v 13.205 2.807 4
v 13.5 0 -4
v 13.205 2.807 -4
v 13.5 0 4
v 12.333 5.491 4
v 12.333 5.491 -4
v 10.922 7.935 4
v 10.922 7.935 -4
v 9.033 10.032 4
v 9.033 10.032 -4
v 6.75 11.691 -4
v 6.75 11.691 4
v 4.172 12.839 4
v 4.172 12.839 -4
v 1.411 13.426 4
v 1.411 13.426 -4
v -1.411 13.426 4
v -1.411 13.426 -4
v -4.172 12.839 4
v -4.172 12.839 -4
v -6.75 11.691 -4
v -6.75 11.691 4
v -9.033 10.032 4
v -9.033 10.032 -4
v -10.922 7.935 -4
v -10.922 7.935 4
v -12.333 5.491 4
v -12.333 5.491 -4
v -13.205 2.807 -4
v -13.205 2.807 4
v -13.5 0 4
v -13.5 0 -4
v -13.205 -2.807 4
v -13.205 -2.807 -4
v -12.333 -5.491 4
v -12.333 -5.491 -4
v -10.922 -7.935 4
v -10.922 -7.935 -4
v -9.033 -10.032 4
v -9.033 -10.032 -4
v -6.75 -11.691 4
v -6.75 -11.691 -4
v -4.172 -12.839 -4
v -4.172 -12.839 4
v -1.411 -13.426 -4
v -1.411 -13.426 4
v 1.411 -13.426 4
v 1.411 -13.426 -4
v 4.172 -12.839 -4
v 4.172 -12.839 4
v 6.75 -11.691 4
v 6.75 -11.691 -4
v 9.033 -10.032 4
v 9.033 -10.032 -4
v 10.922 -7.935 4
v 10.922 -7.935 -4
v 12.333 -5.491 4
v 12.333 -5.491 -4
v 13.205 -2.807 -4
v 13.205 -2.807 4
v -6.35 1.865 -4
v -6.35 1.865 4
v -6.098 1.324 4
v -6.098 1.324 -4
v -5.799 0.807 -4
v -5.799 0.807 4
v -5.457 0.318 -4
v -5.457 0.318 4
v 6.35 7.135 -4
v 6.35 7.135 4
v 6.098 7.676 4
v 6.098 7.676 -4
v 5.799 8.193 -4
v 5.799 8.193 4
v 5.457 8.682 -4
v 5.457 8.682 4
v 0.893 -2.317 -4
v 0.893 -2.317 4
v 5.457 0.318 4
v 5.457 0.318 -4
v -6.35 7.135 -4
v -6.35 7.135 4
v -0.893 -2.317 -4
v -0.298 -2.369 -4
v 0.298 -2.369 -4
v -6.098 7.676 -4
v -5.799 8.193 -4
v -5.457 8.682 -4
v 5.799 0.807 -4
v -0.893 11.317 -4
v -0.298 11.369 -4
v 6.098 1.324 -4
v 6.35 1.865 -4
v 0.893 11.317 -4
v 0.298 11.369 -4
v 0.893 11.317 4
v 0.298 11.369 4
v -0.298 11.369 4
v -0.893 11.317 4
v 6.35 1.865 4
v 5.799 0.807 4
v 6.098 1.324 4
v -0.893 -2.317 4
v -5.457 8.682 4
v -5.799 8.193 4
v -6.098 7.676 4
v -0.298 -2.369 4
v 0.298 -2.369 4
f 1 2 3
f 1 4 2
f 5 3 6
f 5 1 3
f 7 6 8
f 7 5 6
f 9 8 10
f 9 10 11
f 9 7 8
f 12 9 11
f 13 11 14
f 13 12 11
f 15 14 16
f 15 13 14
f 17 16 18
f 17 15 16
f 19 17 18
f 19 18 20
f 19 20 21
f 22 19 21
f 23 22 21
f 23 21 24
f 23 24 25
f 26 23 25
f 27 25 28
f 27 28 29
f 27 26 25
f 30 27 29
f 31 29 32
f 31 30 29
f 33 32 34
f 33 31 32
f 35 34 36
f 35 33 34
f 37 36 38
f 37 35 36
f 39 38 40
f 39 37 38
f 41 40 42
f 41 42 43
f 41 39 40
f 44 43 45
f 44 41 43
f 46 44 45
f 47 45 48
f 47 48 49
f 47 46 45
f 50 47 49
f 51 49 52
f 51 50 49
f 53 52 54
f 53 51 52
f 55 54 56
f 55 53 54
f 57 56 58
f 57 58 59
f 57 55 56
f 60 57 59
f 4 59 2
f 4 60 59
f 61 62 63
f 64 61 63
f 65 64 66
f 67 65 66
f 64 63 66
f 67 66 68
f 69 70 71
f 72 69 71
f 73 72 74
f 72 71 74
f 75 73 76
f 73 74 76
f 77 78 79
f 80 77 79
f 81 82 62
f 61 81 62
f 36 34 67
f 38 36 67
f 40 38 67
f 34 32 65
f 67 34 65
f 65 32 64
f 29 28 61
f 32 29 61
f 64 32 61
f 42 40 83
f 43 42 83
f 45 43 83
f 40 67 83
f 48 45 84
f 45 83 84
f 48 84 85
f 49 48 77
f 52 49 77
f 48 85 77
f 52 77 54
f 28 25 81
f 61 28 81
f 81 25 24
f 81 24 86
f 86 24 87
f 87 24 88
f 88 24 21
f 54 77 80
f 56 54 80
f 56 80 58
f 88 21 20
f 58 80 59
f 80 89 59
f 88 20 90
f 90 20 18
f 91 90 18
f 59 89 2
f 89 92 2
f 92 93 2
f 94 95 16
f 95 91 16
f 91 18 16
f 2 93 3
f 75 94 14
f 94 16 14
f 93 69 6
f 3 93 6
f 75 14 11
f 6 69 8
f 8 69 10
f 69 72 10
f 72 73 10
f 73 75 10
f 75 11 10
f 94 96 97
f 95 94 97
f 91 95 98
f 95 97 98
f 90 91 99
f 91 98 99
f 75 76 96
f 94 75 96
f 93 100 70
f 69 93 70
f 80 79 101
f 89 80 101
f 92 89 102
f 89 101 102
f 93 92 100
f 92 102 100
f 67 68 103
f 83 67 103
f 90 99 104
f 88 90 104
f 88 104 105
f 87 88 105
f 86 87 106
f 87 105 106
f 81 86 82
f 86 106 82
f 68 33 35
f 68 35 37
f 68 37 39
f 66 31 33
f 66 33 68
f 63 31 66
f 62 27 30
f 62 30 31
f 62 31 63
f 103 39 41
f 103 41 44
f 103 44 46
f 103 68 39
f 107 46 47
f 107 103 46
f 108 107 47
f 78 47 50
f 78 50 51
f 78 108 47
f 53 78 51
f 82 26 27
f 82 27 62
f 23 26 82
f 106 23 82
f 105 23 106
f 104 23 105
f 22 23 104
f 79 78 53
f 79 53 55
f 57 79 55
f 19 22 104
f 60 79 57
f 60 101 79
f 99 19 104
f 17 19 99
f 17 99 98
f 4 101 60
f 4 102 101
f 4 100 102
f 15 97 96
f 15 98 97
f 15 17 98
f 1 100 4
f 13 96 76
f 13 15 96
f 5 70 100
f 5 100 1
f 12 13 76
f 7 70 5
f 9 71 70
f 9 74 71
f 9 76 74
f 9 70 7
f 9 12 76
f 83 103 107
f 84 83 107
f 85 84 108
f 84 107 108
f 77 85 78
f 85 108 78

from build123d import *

# Parameters (mm, degrees)
SKETCH1_R           = 13.5
BOSS_EXTRUDE1_DEPTH = 4
CUT_EXTRUDE1_DEPTH  = 21.700241544


with BuildPart() as part:
    # Sketch1 → Boss-Extrude1 (new, symmetric)
    with BuildSketch(Plane.XY):
        Circle(SKETCH1_R)
    extrude(amount=BOSS_EXTRUDE1_DEPTH, both=True)

    # Sketch2 → Cut-Extrude1 (cut, through all)
    with BuildSketch(Plane.XY.offset(4)):
        with BuildLine():
            Line((-0.893039494, 11.316751826), (-5.456960506, 8.681770802))
            ThreePointArc((-5.456960506, 8.681770802), (-5.953924651, 7.9375), (-6.35, 7.134981025))
            Line((-6.35, 7.134981025), (-6.35, 1.865018975))
            ThreePointArc((-6.35, 1.865018975), (-5.953924651, 1.0625), (-5.456960506, 0.318229198))
            Line((-5.456960506, 0.318229198), (-0.893039494, -2.316751826))
            ThreePointArc((-0.893039494, -2.316751826), (0, -2.375), (0.893039494, -2.316751826))
            Line((0.893039494, -2.316751826), (5.456960506, 0.318229198))
            ThreePointArc((5.456960506, 0.318229198), (5.953924651, 1.0625), (6.35, 1.865018975))
            Line((6.35, 1.865018975), (6.35, 7.134981025))
            ThreePointArc((6.35, 7.134981025), (5.953924651, 7.9375), (5.456960506, 8.681770802))
            Line((5.456960506, 8.681770802), (0.893039494, 11.316751826))
            ThreePointArc((0.893039494, 11.316751826), (0, 11.375), (-0.893039494, 11.316751826))
        make_face()
    extrude(amount=-CUT_EXTRUDE1_DEPTH, mode=Mode.SUBTRACT)


solid = part.part
